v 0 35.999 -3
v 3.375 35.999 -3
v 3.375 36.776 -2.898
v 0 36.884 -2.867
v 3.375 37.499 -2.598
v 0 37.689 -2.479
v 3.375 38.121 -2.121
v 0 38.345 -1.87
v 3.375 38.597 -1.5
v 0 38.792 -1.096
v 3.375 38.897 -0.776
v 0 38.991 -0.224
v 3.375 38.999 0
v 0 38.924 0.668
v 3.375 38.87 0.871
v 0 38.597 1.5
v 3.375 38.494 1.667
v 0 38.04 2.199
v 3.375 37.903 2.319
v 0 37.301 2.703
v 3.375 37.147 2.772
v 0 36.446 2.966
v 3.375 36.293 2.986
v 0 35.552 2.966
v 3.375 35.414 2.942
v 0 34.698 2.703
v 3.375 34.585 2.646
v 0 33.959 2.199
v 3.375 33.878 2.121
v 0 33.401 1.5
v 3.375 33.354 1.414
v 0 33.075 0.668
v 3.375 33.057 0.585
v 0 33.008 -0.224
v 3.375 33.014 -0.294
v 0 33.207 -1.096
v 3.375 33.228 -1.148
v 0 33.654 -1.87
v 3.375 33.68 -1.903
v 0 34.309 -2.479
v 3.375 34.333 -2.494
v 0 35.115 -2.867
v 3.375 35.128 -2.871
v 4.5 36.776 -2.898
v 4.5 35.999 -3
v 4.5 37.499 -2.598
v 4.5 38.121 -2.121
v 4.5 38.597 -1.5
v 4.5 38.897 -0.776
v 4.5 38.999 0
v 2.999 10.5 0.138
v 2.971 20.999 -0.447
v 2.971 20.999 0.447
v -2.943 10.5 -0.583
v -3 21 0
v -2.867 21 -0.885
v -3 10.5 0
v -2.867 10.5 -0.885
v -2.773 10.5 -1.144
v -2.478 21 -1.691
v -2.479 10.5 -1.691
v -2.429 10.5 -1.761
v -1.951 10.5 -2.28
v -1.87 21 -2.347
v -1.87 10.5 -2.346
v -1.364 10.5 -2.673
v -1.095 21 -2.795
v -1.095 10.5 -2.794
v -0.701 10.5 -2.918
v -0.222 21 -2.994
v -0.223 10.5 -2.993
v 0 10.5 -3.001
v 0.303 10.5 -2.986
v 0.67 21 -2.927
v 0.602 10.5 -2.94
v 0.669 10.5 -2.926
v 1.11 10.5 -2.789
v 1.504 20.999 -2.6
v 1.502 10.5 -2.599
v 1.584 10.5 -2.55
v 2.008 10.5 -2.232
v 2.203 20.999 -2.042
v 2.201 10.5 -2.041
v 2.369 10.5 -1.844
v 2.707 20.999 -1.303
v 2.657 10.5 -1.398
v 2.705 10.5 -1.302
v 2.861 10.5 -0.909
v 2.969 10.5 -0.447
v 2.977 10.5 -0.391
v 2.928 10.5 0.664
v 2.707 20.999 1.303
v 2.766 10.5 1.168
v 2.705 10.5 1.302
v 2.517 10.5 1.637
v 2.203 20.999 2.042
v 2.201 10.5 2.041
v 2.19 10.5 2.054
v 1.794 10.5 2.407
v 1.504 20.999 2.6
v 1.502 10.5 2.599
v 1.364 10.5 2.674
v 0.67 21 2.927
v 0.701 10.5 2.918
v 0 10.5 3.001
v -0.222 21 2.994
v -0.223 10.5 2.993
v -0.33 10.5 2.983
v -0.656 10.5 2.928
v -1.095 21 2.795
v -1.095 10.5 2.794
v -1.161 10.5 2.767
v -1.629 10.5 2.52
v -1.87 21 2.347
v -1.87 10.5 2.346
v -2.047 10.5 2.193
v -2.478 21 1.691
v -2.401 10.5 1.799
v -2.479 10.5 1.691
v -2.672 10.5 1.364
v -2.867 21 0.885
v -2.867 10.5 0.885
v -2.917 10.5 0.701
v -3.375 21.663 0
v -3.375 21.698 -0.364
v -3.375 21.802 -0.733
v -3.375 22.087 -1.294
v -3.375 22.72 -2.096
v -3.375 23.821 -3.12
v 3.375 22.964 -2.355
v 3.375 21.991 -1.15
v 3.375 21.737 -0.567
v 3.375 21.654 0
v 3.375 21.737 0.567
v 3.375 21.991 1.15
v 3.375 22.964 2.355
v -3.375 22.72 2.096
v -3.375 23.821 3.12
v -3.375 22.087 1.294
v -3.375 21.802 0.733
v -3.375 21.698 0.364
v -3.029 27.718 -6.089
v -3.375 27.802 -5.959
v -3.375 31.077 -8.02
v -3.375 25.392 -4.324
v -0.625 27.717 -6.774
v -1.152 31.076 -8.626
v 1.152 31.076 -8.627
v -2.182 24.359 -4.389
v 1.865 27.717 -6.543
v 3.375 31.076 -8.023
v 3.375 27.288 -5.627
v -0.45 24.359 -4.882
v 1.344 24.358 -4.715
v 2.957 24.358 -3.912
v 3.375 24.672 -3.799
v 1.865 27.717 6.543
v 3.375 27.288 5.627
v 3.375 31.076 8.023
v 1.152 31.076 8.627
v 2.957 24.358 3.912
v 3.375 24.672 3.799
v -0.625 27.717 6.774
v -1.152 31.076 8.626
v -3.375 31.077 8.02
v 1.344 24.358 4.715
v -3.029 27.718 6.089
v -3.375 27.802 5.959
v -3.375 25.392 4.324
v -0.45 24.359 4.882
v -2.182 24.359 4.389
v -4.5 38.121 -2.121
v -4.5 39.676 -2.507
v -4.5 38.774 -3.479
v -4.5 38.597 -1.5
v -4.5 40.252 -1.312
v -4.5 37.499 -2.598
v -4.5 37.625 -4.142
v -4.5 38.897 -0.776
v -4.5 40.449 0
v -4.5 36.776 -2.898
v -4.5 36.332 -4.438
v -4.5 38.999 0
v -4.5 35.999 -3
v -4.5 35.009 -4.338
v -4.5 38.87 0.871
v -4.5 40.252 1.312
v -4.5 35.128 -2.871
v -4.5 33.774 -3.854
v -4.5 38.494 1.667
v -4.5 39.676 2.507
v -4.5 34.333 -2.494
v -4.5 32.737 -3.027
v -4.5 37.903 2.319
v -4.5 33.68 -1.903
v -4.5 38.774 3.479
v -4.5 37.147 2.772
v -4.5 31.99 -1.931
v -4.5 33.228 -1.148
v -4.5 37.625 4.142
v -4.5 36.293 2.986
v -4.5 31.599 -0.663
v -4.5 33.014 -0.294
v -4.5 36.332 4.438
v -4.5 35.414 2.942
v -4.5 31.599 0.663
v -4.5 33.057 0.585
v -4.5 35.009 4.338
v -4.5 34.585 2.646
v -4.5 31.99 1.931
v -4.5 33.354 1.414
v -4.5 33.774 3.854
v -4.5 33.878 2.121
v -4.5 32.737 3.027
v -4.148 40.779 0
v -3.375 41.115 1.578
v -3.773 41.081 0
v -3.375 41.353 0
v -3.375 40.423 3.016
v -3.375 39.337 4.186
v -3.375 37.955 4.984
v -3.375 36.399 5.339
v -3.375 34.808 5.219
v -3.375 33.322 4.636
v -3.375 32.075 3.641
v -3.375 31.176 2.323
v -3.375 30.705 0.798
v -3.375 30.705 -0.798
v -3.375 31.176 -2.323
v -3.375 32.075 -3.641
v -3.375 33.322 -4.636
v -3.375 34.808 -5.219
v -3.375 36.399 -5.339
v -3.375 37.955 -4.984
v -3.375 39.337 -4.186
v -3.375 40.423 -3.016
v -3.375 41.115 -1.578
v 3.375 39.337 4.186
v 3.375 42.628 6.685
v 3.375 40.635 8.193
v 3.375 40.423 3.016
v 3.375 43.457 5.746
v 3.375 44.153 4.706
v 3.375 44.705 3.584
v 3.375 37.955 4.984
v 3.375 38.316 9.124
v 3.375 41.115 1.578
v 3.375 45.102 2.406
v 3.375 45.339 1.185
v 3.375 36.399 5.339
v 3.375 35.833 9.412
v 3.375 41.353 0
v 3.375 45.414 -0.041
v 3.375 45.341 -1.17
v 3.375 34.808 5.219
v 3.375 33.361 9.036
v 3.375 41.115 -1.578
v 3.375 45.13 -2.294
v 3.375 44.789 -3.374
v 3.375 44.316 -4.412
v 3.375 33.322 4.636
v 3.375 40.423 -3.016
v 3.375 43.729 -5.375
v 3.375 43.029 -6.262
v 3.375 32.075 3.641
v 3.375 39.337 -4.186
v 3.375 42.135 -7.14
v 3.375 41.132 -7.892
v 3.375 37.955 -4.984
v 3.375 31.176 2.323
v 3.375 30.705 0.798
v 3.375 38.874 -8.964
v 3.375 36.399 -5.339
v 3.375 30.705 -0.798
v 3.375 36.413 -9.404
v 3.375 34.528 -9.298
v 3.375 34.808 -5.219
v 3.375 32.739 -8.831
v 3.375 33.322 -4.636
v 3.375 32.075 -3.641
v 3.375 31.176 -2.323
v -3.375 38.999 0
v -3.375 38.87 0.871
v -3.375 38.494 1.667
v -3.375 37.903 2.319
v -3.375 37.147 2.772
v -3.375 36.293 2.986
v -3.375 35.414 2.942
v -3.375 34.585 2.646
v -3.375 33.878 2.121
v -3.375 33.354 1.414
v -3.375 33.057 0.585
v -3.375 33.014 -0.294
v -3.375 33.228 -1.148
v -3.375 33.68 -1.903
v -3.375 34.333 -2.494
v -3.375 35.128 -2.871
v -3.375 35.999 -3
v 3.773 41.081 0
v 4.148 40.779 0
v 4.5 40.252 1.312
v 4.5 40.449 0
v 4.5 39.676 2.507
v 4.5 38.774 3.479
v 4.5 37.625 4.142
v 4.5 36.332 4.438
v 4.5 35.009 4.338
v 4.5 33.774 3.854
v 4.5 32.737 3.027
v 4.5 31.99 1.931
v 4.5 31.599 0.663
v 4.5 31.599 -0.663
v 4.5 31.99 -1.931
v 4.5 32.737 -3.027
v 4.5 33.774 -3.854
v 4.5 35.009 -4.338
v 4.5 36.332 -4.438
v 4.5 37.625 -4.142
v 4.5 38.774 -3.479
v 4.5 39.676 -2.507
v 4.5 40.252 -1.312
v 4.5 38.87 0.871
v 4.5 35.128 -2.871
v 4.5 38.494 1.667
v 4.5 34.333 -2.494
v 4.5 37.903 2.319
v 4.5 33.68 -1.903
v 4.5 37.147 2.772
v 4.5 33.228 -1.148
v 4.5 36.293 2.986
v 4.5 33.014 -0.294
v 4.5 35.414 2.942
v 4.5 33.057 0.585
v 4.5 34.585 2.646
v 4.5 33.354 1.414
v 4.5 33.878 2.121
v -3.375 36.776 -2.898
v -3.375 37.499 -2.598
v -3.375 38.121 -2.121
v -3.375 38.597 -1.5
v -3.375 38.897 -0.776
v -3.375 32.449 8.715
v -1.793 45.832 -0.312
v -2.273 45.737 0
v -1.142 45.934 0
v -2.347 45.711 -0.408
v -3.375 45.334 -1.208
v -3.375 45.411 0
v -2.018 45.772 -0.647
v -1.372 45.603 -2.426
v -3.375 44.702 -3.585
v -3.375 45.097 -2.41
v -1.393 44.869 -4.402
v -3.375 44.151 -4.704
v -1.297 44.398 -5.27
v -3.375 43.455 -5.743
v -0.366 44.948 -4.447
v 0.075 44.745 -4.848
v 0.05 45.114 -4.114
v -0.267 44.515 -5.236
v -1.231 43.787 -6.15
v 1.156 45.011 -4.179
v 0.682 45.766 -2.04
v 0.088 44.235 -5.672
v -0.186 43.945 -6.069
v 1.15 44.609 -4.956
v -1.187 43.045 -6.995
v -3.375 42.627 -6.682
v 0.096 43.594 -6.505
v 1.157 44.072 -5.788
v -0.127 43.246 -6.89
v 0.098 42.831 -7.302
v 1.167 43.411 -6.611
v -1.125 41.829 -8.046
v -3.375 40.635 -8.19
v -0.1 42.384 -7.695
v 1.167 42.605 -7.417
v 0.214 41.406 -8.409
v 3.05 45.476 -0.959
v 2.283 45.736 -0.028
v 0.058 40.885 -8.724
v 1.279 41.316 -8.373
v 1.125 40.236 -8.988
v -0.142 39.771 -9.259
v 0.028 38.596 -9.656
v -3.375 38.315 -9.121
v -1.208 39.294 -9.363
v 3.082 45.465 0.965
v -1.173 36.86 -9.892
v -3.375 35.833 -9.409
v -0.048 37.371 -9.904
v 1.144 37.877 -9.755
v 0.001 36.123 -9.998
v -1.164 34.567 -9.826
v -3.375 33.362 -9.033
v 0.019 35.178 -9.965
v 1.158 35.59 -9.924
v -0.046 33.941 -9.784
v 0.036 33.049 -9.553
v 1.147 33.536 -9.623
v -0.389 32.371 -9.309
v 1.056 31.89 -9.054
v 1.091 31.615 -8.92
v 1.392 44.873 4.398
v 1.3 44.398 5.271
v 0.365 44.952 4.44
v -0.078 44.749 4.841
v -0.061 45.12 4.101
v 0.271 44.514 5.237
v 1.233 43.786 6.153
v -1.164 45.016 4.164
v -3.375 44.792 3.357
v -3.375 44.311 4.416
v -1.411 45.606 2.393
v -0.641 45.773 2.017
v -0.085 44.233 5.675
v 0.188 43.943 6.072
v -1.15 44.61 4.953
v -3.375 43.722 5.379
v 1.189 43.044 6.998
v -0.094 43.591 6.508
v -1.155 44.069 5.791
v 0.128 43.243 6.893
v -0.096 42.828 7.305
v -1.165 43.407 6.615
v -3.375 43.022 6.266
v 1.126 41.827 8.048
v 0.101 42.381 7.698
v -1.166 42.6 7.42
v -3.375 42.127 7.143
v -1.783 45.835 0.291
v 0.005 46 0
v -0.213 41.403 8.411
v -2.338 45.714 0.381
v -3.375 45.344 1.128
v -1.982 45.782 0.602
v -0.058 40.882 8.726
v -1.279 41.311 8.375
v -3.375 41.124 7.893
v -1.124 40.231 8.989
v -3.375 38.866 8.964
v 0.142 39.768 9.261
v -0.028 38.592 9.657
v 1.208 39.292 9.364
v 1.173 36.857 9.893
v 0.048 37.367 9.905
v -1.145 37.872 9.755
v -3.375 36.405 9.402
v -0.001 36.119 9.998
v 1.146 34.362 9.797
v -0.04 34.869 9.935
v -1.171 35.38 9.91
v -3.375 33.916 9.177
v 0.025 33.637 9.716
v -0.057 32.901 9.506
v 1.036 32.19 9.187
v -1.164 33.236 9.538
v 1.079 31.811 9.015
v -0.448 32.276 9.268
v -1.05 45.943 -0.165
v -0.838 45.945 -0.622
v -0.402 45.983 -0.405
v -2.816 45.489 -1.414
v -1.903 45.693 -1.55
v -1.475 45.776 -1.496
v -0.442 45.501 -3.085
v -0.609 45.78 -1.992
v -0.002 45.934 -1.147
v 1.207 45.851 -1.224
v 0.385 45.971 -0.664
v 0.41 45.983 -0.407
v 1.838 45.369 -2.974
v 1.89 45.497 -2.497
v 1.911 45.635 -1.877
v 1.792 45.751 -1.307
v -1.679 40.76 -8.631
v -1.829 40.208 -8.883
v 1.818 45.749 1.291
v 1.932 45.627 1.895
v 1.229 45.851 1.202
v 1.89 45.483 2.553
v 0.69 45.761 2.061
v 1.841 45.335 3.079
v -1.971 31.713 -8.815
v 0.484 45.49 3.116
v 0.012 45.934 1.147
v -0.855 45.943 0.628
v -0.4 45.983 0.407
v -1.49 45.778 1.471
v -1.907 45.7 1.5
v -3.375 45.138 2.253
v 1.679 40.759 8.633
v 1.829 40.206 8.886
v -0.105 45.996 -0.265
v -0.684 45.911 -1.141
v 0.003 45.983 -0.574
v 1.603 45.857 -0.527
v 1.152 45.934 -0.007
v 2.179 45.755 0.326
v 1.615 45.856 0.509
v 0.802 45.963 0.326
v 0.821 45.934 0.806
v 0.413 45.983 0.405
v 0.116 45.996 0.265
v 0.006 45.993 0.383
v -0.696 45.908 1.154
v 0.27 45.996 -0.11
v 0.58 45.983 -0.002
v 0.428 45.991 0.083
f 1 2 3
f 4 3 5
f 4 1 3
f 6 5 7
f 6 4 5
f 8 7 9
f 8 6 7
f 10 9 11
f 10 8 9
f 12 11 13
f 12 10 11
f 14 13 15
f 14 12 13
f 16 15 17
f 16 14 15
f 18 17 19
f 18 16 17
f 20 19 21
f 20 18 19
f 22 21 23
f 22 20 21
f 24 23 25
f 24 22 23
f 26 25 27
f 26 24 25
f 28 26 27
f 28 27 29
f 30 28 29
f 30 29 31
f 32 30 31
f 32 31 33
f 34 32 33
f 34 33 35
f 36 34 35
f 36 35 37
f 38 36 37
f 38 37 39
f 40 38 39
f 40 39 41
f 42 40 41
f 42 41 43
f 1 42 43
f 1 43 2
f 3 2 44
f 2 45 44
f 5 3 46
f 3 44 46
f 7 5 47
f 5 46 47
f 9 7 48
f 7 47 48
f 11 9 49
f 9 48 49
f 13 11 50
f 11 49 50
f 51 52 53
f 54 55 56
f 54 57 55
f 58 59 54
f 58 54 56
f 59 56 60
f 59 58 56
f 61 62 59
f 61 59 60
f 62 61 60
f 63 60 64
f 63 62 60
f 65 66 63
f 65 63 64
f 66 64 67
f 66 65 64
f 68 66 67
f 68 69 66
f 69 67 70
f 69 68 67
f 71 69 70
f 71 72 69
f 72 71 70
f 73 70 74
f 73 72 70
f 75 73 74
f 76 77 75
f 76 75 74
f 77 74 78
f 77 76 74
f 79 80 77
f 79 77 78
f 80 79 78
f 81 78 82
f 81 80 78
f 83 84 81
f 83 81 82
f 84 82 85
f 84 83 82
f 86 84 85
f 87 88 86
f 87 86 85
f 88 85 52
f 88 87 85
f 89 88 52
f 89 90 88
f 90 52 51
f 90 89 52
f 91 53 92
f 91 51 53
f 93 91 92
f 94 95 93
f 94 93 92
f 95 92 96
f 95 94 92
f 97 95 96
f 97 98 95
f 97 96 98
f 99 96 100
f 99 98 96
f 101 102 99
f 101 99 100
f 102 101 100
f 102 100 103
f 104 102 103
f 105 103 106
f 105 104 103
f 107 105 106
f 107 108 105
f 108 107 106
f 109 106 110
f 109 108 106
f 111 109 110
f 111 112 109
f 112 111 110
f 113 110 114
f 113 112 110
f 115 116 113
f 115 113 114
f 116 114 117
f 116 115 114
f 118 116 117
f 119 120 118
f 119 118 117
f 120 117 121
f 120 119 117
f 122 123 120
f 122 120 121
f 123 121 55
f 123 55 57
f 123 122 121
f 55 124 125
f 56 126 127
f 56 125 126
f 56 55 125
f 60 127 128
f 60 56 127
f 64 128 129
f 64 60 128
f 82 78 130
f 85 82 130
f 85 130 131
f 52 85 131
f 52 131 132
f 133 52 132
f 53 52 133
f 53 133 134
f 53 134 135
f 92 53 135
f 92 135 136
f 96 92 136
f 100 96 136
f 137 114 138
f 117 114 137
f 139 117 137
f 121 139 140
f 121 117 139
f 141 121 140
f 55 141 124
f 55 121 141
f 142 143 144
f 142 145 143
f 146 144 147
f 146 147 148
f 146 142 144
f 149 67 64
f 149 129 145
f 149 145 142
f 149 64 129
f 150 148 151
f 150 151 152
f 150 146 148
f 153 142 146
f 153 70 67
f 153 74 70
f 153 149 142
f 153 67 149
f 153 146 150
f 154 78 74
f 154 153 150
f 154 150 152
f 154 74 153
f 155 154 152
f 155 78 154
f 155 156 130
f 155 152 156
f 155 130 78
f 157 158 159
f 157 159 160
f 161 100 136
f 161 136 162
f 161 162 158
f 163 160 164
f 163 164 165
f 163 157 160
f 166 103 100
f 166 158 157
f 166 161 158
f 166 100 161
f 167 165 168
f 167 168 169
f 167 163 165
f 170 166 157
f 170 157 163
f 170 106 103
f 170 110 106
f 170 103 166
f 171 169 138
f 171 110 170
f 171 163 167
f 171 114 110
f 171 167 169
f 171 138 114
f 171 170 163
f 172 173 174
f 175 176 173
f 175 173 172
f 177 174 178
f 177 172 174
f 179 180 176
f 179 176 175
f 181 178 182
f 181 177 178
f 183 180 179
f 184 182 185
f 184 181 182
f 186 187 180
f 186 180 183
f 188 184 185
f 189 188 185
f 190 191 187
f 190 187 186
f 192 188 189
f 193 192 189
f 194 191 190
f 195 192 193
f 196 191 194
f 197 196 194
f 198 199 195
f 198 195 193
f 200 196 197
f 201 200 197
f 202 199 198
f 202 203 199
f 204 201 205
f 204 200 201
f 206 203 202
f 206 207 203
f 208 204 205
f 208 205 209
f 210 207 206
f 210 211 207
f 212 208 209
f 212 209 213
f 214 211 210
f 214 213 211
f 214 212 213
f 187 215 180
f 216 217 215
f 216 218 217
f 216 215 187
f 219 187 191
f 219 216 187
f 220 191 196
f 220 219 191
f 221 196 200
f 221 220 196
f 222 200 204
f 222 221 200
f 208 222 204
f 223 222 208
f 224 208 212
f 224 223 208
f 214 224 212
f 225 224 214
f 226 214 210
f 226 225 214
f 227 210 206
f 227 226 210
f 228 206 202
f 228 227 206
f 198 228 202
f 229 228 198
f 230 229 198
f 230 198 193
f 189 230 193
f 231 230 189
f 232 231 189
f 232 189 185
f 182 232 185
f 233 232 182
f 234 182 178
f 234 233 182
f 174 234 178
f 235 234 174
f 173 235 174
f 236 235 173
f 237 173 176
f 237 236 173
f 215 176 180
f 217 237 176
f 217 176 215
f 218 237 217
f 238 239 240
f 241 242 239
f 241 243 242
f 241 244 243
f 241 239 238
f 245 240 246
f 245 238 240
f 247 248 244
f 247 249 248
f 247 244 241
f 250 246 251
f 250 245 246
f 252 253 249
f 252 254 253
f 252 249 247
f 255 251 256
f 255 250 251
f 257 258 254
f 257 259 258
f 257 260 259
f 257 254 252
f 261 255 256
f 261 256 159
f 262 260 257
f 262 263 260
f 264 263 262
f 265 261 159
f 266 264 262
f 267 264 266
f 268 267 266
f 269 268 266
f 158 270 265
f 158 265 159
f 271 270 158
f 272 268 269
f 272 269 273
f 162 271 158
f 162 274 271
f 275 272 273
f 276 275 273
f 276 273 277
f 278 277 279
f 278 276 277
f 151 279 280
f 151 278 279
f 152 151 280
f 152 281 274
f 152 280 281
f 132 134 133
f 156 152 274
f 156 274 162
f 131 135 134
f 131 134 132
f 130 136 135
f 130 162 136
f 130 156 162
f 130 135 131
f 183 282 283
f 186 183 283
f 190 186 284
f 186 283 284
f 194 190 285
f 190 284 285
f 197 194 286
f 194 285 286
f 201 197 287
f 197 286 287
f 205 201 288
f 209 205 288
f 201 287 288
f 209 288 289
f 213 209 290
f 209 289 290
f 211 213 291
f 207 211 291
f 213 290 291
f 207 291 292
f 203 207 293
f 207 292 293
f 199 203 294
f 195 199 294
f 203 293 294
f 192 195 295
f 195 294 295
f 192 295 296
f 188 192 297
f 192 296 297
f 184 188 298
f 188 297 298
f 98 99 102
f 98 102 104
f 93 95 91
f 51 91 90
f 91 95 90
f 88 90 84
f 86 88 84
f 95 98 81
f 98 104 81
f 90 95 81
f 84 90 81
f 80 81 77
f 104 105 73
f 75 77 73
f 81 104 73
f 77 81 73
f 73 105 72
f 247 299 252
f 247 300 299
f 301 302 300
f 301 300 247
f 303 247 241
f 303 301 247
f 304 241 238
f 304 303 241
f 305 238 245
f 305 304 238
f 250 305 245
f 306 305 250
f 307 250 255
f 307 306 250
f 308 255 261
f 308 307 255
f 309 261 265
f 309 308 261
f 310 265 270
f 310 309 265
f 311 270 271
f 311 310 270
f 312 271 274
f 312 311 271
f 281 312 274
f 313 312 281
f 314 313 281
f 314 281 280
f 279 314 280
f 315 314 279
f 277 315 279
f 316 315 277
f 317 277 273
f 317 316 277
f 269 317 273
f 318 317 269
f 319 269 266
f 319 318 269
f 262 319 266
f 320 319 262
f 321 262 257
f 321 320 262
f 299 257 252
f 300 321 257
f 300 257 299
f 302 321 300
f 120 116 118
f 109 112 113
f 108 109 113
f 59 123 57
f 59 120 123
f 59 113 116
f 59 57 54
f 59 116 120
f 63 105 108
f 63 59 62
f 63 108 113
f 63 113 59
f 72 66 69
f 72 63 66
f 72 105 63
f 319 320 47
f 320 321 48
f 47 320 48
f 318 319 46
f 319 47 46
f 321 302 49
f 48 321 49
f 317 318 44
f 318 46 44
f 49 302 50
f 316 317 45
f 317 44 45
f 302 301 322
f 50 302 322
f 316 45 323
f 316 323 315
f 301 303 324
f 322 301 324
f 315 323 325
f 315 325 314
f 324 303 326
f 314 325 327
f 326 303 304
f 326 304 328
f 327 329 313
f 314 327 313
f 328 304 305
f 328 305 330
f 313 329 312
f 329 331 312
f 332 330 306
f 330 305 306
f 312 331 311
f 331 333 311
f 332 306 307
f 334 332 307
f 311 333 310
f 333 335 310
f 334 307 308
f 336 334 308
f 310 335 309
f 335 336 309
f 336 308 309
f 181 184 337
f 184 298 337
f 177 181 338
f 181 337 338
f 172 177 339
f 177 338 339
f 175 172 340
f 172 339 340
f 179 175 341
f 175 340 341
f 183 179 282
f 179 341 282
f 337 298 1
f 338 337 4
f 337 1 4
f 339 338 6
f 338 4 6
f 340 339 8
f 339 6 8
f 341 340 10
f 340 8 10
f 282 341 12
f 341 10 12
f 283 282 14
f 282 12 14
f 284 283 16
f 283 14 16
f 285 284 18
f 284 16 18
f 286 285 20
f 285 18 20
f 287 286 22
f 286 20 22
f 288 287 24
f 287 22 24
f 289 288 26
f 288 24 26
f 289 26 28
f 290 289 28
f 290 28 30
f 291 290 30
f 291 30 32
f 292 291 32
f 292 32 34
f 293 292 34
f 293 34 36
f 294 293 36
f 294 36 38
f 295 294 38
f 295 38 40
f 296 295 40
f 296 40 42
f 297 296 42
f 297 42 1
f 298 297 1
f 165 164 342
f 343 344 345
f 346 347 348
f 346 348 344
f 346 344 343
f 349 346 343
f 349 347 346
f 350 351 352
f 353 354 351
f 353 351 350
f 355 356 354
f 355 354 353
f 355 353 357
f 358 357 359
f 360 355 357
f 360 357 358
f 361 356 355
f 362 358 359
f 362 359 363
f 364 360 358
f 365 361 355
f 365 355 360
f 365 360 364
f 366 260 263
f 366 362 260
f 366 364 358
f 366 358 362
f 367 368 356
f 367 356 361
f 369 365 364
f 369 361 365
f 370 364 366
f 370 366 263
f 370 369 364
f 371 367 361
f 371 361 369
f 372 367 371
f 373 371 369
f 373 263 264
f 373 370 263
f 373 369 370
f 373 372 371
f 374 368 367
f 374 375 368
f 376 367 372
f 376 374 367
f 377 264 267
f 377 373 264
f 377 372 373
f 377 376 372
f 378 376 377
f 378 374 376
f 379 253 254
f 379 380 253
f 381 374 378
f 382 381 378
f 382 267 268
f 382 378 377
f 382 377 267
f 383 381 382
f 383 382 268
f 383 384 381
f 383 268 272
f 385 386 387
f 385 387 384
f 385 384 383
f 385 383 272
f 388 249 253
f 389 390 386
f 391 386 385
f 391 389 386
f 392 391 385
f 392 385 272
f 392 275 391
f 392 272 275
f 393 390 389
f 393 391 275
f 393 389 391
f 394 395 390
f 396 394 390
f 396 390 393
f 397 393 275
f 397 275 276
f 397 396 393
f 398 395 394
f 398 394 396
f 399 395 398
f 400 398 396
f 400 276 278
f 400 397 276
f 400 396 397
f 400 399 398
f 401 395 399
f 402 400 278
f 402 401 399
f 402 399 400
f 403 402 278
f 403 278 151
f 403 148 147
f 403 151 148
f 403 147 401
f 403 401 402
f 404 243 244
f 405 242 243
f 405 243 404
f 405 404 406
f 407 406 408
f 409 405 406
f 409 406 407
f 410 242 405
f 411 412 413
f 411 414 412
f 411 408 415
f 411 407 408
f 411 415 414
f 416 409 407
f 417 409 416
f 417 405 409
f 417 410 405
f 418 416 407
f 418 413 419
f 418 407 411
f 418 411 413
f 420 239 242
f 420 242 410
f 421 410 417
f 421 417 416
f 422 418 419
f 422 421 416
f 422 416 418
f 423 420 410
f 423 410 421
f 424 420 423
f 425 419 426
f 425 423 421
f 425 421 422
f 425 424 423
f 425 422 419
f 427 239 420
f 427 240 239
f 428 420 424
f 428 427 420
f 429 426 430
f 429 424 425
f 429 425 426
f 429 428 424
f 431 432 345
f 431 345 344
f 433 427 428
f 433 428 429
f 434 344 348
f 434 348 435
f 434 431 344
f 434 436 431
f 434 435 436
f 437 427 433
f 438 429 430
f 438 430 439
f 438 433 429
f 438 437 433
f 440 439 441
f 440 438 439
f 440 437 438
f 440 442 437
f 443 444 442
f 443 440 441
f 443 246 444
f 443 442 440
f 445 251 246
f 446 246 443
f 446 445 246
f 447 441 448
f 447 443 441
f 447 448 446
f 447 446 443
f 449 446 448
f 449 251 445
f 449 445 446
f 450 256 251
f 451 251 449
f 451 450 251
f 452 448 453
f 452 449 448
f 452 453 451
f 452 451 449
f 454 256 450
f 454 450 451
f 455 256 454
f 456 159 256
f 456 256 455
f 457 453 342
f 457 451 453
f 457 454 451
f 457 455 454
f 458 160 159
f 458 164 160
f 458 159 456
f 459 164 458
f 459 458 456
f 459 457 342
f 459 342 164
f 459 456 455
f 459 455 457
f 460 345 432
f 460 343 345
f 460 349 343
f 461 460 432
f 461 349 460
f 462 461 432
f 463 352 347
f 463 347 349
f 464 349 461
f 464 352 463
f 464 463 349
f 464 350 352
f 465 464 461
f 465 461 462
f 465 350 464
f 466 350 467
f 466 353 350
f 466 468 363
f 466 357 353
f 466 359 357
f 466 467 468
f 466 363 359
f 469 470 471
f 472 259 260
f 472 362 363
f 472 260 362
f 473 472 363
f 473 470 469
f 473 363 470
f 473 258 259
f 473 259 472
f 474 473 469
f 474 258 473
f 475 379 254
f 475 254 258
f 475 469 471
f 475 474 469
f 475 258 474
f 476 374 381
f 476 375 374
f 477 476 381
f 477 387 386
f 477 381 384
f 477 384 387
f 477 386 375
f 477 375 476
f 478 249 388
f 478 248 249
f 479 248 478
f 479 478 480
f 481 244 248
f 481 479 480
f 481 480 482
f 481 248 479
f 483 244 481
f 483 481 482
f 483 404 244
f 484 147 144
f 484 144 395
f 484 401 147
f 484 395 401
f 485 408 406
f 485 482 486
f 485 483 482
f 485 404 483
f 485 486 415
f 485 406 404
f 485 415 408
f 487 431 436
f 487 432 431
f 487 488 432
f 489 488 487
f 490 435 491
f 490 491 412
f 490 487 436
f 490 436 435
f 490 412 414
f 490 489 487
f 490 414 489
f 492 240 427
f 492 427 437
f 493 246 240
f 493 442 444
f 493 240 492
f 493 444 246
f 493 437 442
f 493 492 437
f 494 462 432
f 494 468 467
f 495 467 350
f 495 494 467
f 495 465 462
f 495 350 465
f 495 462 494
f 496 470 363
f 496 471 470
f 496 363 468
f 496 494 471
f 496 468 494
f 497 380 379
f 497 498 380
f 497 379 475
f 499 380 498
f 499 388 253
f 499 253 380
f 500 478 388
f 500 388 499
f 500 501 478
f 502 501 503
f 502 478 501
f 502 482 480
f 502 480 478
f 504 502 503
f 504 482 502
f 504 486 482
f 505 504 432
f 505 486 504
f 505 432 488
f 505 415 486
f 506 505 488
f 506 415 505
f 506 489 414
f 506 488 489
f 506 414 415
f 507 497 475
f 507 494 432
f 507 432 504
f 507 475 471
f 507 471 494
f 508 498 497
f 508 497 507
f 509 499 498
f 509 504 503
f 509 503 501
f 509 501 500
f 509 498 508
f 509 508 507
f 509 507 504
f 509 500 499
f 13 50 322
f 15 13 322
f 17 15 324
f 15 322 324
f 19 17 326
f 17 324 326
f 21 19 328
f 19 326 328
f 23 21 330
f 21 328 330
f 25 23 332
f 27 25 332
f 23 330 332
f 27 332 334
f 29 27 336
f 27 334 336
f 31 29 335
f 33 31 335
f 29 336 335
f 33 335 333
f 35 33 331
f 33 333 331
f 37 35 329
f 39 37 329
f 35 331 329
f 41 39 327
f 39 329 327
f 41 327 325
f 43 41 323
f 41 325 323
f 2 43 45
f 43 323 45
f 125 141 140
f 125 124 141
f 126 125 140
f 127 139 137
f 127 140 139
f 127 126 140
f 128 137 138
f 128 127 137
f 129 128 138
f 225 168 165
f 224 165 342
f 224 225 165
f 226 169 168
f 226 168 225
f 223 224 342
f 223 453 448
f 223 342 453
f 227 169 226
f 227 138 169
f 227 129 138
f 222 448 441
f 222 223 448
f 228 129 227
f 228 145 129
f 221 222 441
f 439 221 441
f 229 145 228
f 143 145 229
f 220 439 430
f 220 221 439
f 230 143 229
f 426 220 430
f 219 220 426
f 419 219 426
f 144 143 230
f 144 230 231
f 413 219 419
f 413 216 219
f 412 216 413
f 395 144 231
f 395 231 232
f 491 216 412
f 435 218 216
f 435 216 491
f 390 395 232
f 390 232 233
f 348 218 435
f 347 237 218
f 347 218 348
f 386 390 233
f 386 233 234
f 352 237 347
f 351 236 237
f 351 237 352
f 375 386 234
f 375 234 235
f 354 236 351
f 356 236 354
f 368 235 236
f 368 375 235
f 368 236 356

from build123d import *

# Parameters (mm, degrees)
WYTNIJ_WYCI_GNI_CIE1_DEPTH      = 10.998876849
WYTNIJ_WYCI_GNI_CIE1_DEPTH_BACK = 10.998876849
SZKIC4_W                        = 1.45
SZKIC4_H                        = 9
SZKIC8_R                        = 3
WYTNIJ_WYCI_GNI_CIE3_DEPTH      = 5.5
WYTNIJ_WYCI_GNI_CIE3_DEPTH_BACK = 5.5
SKETCH2_W                       = 18.954630749
SKETCH2_H                       = 12.318293367
CUT_EXTRUDE2_DEPTH              = 5.5
CUT_EXTRUDE2_DEPTH_BACK         = 5.5


with BuildPart() as part:
    # Szkic1 one side → Obrót4 (revolve)
    with BuildSketch(Plane.XY):
        with BuildLine():
            Line((-3, 21), (-3, 0))
            Line((-3, 0), (0, 0))
            Line((0, 0), (0.005166955, 46))
            ThreePointArc((0.005166955, 46), (-8.632770826, 41.038455208), (-8.699205566, 31.077206177))
            Line((-8.699205566, 31.077206177), (-3, 21))
        make_face()
    revolve(axis=Axis((0.005166955, 46, 0), (-0.000112325, -0.999999994, 0)))

    # Szkic2 → Wytnij-wyciągnięcie1 (cut, two sides)
    with BuildSketch(Plane.XY) as wytnij_wyci_gni_cie1_sk:
        Polygon((-3.375, 46), (-20, 46), (-20, 10.866665268), (-3.375, 21.663066505), align=None)
        Polygon((20, 46), (3.375, 46), (3.375, 21.65370739), (20, 10.857306153), align=None)
    extrude(amount=WYTNIJ_WYCI_GNI_CIE1_DEPTH, mode=Mode.SUBTRACT)
    extrude(wytnij_wyci_gni_cie1_sk.sketch, amount=-WYTNIJ_WYCI_GNI_CIE1_DEPTH_BACK, mode=Mode.SUBTRACT)

    # Szkic4 → Obrót5 (revolve)
    with BuildSketch(Plane.YX):
        with BuildLine():
            Line((40.449326049, 4.5), (40.449326049, -4.5))
            ThreePointArc((40.449326049, -4.5), (41.839498769, -2.438212993), (42.328030498, 0))
            ThreePointArc((42.328030498, 0), (41.839498769, 2.438212993), (40.449326049, 4.5))
        make_face()
        with Locations((39.724326049, 0)):
            Rectangle(SZKIC4_W, SZKIC4_H)
    revolve(axis=Axis((-0.999999975, 35.999326049, 0), (1, 0, 0)))

    # Szkic8 → Wytnij-wyciągnięcie3 (cut, two sides)
    with BuildSketch(Plane(origin=(0, 0, 0), x_dir=(0, 0, -1), z_dir=(1, 0, 0))) as wytnij_wyci_gni_cie3_sk:
        with Locations((0, 35.999326049)):
            Circle(SZKIC8_R)
    extrude(amount=WYTNIJ_WYCI_GNI_CIE3_DEPTH, mode=Mode.SUBTRACT)
    extrude(wytnij_wyci_gni_cie3_sk.sketch, amount=-WYTNIJ_WYCI_GNI_CIE3_DEPTH_BACK, mode=Mode.SUBTRACT)

    # Sketch2 → Cut-Extrude2 (cut, two sides)
    with BuildSketch(Plane(origin=(0, 0, 0), x_dir=(0, 0, -1), z_dir=(1, 0, 0))) as cut_extrude2_sk:
        with Locations((0.852276563, 4.340516208)):
            Rectangle(SKETCH2_W, SKETCH2_H)
    extrude(amount=CUT_EXTRUDE2_DEPTH, mode=Mode.SUBTRACT)
    extrude(cut_extrude2_sk.sketch, amount=-CUT_EXTRUDE2_DEPTH_BACK, mode=Mode.SUBTRACT)


solid = part.part
